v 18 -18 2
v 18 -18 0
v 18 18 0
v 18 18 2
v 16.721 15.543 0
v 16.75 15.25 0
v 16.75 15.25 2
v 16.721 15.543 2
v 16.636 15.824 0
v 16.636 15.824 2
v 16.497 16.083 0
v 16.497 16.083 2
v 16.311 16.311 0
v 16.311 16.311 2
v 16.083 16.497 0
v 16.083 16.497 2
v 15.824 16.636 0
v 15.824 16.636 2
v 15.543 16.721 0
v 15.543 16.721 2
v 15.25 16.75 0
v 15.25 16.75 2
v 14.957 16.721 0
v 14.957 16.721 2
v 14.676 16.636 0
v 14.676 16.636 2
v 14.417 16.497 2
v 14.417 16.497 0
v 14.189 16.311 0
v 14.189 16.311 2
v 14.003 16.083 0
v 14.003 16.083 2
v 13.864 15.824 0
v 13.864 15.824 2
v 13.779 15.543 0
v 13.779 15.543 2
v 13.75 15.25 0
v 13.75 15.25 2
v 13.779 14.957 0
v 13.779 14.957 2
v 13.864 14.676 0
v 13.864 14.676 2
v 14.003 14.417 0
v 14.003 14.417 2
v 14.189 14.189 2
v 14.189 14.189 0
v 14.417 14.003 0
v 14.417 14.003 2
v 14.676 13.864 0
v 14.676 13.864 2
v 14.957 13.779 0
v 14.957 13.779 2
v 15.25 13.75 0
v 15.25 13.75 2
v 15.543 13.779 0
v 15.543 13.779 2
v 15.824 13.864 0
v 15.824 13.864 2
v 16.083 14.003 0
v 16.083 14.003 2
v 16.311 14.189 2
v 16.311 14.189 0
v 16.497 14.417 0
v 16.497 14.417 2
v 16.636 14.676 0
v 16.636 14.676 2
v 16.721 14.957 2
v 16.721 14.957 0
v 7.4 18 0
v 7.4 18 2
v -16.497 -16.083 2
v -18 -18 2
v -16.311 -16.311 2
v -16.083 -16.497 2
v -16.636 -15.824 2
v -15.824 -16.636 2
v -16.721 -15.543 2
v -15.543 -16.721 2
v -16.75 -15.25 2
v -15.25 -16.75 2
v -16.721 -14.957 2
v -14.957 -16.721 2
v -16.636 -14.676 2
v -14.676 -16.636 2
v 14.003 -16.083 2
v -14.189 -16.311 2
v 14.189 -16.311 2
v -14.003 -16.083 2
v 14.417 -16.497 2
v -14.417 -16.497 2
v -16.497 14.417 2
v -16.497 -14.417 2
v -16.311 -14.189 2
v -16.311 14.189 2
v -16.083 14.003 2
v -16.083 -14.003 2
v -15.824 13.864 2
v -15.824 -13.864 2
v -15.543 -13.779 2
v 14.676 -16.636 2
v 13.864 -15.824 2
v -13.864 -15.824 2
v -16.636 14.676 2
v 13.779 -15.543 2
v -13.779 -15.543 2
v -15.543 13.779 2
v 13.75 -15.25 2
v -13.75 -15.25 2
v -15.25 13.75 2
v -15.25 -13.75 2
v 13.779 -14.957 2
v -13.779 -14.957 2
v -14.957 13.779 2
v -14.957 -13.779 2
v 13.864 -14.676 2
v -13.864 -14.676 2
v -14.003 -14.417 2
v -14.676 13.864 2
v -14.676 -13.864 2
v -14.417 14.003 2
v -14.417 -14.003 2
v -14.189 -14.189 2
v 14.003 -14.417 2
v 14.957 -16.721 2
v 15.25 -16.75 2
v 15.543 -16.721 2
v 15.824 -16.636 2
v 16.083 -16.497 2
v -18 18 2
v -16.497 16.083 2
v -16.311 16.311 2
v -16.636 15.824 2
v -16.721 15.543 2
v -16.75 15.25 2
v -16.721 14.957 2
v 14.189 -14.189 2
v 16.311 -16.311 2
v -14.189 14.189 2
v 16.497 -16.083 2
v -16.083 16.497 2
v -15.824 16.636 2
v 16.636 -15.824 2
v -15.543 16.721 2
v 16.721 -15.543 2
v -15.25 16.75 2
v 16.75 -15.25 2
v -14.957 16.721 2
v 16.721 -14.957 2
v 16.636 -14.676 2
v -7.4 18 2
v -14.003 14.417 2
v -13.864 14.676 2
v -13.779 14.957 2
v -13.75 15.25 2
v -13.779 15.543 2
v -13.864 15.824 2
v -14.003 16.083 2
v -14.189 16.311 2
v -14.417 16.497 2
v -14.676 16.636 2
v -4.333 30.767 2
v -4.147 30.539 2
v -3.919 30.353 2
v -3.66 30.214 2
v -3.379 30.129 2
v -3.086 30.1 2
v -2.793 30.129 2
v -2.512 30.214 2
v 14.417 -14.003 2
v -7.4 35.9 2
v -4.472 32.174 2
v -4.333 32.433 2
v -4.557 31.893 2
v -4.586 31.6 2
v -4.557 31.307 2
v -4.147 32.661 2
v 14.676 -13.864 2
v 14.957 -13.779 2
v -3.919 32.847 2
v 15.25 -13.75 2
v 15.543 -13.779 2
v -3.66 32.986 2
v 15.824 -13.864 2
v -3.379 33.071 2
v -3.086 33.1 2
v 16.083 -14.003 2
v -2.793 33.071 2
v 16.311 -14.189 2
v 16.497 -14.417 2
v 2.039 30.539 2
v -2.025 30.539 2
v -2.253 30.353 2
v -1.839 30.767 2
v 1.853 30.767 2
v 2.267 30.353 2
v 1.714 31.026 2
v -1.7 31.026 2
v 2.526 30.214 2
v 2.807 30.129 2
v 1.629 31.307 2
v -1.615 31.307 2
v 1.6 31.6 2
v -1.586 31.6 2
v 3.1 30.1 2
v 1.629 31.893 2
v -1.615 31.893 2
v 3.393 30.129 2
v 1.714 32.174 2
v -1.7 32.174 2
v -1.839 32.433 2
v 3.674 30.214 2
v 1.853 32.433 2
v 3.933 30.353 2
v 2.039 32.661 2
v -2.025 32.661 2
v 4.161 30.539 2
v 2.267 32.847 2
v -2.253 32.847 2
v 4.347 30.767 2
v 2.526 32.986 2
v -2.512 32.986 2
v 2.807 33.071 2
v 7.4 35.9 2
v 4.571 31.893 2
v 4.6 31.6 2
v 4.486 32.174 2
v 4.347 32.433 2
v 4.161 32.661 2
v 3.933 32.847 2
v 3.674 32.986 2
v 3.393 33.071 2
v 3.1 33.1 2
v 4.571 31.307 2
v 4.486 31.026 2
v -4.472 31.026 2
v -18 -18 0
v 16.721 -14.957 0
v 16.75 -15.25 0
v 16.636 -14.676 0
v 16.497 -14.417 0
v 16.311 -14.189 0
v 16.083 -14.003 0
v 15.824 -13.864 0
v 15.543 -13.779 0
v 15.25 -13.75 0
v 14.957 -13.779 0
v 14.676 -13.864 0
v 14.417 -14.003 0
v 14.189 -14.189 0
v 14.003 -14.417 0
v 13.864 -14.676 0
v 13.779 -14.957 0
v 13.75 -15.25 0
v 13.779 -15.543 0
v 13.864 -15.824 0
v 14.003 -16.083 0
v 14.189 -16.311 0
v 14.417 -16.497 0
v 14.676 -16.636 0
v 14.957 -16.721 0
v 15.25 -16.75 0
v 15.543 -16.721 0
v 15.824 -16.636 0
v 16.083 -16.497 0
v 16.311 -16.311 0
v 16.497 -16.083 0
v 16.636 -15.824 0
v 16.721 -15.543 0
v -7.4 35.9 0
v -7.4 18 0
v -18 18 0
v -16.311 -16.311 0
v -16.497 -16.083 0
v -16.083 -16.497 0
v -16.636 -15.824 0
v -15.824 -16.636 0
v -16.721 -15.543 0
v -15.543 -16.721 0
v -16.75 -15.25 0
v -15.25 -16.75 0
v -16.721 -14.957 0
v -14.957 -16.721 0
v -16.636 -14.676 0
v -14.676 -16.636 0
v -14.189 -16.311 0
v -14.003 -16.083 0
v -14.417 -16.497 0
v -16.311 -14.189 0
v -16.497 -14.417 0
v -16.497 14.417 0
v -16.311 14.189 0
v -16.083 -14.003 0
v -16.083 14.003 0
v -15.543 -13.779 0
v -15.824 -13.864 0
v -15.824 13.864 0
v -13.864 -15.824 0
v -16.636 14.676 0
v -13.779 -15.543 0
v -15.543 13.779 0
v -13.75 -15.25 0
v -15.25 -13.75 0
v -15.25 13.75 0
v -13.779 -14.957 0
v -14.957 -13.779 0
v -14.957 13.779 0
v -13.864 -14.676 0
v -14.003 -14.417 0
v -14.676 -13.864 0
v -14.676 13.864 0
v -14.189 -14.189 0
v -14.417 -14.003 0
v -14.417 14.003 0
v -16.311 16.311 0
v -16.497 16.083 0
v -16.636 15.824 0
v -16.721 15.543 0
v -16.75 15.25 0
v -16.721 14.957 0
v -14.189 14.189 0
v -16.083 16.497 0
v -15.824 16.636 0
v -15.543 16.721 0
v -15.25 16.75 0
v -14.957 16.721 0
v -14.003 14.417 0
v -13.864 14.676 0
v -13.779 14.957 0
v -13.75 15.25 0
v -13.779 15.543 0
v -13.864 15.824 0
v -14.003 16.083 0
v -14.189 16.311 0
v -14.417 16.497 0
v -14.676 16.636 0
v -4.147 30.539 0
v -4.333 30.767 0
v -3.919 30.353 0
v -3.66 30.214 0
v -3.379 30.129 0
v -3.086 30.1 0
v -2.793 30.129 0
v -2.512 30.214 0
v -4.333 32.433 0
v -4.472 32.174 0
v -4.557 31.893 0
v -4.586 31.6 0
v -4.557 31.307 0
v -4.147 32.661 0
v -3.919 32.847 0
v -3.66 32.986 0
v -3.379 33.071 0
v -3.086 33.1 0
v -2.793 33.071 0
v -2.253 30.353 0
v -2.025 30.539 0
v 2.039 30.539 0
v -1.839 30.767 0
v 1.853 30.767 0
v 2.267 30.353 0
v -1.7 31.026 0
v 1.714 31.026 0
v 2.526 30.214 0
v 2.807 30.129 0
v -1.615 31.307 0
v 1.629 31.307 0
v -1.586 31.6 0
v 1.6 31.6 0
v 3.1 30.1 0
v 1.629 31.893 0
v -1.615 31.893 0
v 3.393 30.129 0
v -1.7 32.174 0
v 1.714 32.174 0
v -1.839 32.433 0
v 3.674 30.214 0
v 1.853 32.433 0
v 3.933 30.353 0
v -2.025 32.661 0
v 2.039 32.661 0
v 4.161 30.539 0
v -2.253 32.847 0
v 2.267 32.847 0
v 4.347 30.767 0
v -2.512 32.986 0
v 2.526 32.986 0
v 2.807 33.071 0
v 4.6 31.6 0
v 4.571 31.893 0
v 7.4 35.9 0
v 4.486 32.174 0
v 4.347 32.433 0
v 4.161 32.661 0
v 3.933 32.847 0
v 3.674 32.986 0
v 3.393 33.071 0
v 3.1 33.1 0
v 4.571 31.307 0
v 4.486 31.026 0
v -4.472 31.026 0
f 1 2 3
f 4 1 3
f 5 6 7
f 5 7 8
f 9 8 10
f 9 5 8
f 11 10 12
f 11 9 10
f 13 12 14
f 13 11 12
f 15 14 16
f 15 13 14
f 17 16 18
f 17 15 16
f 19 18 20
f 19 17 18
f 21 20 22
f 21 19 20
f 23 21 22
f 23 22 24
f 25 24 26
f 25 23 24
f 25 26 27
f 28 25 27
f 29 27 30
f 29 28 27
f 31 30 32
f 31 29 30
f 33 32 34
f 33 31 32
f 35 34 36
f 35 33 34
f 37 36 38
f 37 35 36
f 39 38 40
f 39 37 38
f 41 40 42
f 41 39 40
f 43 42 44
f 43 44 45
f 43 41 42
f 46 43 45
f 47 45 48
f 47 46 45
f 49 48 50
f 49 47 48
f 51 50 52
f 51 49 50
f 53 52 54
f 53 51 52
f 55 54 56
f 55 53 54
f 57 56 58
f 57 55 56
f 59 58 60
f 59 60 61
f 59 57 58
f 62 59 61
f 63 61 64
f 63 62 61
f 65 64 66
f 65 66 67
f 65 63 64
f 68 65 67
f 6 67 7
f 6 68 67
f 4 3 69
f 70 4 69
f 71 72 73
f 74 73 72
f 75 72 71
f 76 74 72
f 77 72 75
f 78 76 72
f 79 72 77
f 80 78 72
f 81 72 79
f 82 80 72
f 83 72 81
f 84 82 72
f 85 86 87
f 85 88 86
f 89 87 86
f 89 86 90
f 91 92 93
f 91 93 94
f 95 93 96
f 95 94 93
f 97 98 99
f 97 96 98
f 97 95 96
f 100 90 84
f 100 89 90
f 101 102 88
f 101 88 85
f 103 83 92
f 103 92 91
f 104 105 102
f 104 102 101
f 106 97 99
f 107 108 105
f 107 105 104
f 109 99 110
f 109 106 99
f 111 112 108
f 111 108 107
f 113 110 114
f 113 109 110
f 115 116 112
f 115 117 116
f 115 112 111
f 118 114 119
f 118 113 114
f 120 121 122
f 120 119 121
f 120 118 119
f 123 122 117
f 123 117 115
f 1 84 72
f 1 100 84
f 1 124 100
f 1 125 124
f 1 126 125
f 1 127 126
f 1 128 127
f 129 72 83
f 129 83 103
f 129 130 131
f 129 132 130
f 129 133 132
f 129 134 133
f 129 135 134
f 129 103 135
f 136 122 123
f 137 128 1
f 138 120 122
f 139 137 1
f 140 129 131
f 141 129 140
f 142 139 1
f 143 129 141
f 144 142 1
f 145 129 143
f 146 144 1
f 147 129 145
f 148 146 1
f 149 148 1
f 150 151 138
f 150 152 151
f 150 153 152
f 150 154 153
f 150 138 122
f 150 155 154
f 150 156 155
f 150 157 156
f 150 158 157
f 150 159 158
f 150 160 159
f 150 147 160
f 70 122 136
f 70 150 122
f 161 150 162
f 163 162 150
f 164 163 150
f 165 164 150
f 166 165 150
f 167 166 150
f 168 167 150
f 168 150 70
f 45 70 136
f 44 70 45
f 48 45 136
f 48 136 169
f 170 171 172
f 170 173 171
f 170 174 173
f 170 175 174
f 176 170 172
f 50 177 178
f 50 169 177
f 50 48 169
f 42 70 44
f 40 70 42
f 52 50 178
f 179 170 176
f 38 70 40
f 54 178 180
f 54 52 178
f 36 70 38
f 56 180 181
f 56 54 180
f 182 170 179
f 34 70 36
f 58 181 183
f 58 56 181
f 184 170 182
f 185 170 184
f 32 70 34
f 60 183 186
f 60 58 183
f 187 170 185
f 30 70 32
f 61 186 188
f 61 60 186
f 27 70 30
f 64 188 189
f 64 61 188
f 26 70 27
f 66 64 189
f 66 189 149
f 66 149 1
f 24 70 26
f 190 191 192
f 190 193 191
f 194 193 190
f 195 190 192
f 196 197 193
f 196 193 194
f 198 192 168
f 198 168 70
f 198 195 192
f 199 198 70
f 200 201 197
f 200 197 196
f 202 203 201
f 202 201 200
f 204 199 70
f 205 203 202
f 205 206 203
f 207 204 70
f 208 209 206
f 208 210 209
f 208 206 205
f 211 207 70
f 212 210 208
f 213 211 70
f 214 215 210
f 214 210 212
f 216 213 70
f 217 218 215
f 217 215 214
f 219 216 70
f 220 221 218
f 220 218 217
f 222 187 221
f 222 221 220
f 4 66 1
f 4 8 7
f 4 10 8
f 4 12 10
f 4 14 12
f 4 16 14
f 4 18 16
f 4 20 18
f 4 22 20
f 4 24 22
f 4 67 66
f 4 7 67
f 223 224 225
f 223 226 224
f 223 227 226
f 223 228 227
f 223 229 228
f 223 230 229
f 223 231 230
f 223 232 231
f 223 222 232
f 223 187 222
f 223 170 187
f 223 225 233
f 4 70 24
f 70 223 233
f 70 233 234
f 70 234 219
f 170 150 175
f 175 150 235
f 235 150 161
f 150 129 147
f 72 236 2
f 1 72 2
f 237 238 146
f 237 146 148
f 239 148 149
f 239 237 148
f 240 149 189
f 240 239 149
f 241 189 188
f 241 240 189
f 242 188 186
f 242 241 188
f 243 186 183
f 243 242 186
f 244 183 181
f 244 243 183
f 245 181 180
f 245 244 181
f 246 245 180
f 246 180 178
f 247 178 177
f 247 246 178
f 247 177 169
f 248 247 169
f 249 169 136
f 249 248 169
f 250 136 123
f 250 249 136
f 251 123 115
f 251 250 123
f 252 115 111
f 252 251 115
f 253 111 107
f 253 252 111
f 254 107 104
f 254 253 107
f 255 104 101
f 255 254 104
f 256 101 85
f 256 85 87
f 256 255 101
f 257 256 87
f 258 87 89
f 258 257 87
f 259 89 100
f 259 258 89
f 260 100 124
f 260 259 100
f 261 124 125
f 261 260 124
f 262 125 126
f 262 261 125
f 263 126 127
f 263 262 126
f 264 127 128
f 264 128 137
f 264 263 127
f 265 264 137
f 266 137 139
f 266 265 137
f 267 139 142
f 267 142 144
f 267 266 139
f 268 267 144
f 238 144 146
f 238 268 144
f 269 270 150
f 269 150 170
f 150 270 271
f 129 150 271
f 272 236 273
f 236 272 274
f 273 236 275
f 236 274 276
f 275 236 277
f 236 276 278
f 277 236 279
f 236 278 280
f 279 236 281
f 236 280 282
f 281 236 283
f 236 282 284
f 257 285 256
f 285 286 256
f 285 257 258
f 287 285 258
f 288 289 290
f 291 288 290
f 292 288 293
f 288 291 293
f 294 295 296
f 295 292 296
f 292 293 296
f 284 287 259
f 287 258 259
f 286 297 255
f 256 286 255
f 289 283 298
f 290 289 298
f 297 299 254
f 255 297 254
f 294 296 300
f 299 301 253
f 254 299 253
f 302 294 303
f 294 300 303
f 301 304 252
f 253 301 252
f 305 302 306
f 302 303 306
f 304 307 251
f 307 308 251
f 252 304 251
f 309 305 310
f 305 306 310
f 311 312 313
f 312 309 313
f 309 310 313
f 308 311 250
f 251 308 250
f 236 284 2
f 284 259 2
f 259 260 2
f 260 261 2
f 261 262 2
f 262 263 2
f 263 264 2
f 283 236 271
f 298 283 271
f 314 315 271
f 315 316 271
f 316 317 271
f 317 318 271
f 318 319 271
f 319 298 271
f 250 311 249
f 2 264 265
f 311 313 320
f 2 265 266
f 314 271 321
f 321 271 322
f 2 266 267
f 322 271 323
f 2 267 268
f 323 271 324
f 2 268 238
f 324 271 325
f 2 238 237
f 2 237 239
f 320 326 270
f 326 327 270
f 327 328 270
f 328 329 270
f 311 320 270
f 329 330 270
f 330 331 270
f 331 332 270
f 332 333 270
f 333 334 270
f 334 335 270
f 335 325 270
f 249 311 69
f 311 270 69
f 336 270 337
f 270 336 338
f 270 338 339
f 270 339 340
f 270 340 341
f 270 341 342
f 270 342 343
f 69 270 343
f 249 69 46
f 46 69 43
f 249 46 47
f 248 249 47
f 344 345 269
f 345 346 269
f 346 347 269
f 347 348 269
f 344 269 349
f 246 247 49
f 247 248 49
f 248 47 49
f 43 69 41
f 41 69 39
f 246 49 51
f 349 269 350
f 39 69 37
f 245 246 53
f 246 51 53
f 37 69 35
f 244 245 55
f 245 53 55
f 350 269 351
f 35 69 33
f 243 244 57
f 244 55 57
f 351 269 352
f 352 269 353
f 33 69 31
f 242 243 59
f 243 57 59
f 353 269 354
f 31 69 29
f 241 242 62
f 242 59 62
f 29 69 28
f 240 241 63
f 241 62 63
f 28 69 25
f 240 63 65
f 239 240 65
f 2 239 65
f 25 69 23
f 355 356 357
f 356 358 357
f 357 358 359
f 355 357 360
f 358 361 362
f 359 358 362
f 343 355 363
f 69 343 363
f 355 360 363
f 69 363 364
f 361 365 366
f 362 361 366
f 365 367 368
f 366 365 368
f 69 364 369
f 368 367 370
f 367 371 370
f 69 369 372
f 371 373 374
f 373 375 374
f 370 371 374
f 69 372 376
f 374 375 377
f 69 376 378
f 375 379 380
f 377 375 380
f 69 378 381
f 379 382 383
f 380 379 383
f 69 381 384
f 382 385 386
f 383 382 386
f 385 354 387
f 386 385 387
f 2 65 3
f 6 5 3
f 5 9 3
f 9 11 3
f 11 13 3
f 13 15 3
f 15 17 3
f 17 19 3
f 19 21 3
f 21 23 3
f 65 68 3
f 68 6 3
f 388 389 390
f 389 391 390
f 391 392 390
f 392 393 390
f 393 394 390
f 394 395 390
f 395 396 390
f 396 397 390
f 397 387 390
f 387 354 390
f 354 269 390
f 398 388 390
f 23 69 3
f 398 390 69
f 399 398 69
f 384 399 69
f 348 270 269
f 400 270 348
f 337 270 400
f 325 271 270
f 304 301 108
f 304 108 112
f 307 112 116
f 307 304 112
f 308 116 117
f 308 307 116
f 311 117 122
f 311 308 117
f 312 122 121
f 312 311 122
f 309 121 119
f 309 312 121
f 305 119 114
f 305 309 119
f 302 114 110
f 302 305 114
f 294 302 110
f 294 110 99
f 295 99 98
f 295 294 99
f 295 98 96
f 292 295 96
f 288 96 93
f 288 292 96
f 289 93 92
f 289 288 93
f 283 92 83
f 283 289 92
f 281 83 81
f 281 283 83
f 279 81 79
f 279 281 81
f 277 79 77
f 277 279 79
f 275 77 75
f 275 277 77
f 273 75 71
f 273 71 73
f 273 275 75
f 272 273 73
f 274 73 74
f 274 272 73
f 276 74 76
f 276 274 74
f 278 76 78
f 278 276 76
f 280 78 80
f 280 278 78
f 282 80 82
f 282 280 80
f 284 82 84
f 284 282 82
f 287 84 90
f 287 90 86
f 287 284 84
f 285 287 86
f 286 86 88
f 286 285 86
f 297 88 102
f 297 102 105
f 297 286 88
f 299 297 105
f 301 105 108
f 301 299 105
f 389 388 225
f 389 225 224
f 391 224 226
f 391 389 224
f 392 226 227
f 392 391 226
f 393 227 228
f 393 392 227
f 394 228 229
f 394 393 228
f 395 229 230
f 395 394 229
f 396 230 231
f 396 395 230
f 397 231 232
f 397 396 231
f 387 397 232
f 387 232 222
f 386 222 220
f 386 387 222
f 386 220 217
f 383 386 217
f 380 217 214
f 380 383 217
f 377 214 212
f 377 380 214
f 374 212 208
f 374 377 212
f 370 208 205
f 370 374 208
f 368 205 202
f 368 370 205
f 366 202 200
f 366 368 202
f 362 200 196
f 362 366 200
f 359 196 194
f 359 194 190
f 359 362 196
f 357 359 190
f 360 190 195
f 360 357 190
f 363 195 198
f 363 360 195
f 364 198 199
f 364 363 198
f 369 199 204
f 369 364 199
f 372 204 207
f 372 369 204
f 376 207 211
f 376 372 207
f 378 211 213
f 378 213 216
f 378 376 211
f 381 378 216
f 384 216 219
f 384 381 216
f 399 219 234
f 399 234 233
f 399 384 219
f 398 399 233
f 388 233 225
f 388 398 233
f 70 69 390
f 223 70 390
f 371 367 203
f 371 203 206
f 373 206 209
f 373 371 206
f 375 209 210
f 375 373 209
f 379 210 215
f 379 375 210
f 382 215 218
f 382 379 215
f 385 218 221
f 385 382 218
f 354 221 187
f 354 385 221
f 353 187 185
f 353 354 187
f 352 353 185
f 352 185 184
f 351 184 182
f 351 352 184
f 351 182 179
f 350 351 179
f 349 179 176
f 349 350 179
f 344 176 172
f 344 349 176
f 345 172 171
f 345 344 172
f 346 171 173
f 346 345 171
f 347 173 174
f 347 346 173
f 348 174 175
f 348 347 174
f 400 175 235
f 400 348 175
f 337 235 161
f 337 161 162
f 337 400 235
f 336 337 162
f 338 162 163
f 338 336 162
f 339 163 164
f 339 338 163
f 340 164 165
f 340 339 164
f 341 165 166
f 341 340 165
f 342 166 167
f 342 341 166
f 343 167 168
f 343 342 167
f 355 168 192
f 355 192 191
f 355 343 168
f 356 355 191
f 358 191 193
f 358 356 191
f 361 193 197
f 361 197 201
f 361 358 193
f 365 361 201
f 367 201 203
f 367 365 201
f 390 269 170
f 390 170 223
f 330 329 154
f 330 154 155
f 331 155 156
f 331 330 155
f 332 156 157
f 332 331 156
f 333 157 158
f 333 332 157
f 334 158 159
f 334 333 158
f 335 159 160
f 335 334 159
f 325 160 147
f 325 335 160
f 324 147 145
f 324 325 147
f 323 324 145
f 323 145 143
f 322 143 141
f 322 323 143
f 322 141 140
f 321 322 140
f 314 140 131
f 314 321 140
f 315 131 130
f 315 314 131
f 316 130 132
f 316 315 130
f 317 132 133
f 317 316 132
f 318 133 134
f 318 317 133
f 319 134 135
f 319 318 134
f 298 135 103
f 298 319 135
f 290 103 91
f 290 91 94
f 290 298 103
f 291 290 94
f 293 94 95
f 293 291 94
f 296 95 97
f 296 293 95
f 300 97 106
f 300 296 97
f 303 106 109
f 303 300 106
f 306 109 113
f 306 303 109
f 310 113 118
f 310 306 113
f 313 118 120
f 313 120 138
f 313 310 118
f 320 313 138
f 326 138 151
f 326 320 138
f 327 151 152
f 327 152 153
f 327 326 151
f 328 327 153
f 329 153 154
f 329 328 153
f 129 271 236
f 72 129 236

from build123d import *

# Parameters (mm, degrees)
F0_R     = 1.5
F0_W     = 14.8
F0_H     = 17.9
F1_DEPTH = 2


with BuildPart() as f1:
    # F0 (on Top) → F1 (new body)
    with BuildSketch(Plane.XY):
        Polygon((-7.4, 18), (-18, 18), (-18, -18), (18, -18), (18, 18), (7.4, 18), align=None)
        with Locations((-15.25, -15.25)):
            Circle(F0_R, mode=Mode.SUBTRACT)
        with Locations((15.25, -15.25)):
            Circle(F0_R, mode=Mode.SUBTRACT)
        with Locations((-15.25, 15.25)):
            Circle(F0_R, mode=Mode.SUBTRACT)
        with Locations((15.25, 15.25)):
            Circle(F0_R, mode=Mode.SUBTRACT)
        with Locations((0, 26.95)):
            Rectangle(F0_W, F0_H)
        with Locations((-3.08587, 31.6)):
            Circle(F0_R, mode=Mode.SUBTRACT)
        with Locations((3.1, 31.6)):
            Circle(F0_R, mode=Mode.SUBTRACT)
    extrude(amount=F1_DEPTH)


solid = f1.part
